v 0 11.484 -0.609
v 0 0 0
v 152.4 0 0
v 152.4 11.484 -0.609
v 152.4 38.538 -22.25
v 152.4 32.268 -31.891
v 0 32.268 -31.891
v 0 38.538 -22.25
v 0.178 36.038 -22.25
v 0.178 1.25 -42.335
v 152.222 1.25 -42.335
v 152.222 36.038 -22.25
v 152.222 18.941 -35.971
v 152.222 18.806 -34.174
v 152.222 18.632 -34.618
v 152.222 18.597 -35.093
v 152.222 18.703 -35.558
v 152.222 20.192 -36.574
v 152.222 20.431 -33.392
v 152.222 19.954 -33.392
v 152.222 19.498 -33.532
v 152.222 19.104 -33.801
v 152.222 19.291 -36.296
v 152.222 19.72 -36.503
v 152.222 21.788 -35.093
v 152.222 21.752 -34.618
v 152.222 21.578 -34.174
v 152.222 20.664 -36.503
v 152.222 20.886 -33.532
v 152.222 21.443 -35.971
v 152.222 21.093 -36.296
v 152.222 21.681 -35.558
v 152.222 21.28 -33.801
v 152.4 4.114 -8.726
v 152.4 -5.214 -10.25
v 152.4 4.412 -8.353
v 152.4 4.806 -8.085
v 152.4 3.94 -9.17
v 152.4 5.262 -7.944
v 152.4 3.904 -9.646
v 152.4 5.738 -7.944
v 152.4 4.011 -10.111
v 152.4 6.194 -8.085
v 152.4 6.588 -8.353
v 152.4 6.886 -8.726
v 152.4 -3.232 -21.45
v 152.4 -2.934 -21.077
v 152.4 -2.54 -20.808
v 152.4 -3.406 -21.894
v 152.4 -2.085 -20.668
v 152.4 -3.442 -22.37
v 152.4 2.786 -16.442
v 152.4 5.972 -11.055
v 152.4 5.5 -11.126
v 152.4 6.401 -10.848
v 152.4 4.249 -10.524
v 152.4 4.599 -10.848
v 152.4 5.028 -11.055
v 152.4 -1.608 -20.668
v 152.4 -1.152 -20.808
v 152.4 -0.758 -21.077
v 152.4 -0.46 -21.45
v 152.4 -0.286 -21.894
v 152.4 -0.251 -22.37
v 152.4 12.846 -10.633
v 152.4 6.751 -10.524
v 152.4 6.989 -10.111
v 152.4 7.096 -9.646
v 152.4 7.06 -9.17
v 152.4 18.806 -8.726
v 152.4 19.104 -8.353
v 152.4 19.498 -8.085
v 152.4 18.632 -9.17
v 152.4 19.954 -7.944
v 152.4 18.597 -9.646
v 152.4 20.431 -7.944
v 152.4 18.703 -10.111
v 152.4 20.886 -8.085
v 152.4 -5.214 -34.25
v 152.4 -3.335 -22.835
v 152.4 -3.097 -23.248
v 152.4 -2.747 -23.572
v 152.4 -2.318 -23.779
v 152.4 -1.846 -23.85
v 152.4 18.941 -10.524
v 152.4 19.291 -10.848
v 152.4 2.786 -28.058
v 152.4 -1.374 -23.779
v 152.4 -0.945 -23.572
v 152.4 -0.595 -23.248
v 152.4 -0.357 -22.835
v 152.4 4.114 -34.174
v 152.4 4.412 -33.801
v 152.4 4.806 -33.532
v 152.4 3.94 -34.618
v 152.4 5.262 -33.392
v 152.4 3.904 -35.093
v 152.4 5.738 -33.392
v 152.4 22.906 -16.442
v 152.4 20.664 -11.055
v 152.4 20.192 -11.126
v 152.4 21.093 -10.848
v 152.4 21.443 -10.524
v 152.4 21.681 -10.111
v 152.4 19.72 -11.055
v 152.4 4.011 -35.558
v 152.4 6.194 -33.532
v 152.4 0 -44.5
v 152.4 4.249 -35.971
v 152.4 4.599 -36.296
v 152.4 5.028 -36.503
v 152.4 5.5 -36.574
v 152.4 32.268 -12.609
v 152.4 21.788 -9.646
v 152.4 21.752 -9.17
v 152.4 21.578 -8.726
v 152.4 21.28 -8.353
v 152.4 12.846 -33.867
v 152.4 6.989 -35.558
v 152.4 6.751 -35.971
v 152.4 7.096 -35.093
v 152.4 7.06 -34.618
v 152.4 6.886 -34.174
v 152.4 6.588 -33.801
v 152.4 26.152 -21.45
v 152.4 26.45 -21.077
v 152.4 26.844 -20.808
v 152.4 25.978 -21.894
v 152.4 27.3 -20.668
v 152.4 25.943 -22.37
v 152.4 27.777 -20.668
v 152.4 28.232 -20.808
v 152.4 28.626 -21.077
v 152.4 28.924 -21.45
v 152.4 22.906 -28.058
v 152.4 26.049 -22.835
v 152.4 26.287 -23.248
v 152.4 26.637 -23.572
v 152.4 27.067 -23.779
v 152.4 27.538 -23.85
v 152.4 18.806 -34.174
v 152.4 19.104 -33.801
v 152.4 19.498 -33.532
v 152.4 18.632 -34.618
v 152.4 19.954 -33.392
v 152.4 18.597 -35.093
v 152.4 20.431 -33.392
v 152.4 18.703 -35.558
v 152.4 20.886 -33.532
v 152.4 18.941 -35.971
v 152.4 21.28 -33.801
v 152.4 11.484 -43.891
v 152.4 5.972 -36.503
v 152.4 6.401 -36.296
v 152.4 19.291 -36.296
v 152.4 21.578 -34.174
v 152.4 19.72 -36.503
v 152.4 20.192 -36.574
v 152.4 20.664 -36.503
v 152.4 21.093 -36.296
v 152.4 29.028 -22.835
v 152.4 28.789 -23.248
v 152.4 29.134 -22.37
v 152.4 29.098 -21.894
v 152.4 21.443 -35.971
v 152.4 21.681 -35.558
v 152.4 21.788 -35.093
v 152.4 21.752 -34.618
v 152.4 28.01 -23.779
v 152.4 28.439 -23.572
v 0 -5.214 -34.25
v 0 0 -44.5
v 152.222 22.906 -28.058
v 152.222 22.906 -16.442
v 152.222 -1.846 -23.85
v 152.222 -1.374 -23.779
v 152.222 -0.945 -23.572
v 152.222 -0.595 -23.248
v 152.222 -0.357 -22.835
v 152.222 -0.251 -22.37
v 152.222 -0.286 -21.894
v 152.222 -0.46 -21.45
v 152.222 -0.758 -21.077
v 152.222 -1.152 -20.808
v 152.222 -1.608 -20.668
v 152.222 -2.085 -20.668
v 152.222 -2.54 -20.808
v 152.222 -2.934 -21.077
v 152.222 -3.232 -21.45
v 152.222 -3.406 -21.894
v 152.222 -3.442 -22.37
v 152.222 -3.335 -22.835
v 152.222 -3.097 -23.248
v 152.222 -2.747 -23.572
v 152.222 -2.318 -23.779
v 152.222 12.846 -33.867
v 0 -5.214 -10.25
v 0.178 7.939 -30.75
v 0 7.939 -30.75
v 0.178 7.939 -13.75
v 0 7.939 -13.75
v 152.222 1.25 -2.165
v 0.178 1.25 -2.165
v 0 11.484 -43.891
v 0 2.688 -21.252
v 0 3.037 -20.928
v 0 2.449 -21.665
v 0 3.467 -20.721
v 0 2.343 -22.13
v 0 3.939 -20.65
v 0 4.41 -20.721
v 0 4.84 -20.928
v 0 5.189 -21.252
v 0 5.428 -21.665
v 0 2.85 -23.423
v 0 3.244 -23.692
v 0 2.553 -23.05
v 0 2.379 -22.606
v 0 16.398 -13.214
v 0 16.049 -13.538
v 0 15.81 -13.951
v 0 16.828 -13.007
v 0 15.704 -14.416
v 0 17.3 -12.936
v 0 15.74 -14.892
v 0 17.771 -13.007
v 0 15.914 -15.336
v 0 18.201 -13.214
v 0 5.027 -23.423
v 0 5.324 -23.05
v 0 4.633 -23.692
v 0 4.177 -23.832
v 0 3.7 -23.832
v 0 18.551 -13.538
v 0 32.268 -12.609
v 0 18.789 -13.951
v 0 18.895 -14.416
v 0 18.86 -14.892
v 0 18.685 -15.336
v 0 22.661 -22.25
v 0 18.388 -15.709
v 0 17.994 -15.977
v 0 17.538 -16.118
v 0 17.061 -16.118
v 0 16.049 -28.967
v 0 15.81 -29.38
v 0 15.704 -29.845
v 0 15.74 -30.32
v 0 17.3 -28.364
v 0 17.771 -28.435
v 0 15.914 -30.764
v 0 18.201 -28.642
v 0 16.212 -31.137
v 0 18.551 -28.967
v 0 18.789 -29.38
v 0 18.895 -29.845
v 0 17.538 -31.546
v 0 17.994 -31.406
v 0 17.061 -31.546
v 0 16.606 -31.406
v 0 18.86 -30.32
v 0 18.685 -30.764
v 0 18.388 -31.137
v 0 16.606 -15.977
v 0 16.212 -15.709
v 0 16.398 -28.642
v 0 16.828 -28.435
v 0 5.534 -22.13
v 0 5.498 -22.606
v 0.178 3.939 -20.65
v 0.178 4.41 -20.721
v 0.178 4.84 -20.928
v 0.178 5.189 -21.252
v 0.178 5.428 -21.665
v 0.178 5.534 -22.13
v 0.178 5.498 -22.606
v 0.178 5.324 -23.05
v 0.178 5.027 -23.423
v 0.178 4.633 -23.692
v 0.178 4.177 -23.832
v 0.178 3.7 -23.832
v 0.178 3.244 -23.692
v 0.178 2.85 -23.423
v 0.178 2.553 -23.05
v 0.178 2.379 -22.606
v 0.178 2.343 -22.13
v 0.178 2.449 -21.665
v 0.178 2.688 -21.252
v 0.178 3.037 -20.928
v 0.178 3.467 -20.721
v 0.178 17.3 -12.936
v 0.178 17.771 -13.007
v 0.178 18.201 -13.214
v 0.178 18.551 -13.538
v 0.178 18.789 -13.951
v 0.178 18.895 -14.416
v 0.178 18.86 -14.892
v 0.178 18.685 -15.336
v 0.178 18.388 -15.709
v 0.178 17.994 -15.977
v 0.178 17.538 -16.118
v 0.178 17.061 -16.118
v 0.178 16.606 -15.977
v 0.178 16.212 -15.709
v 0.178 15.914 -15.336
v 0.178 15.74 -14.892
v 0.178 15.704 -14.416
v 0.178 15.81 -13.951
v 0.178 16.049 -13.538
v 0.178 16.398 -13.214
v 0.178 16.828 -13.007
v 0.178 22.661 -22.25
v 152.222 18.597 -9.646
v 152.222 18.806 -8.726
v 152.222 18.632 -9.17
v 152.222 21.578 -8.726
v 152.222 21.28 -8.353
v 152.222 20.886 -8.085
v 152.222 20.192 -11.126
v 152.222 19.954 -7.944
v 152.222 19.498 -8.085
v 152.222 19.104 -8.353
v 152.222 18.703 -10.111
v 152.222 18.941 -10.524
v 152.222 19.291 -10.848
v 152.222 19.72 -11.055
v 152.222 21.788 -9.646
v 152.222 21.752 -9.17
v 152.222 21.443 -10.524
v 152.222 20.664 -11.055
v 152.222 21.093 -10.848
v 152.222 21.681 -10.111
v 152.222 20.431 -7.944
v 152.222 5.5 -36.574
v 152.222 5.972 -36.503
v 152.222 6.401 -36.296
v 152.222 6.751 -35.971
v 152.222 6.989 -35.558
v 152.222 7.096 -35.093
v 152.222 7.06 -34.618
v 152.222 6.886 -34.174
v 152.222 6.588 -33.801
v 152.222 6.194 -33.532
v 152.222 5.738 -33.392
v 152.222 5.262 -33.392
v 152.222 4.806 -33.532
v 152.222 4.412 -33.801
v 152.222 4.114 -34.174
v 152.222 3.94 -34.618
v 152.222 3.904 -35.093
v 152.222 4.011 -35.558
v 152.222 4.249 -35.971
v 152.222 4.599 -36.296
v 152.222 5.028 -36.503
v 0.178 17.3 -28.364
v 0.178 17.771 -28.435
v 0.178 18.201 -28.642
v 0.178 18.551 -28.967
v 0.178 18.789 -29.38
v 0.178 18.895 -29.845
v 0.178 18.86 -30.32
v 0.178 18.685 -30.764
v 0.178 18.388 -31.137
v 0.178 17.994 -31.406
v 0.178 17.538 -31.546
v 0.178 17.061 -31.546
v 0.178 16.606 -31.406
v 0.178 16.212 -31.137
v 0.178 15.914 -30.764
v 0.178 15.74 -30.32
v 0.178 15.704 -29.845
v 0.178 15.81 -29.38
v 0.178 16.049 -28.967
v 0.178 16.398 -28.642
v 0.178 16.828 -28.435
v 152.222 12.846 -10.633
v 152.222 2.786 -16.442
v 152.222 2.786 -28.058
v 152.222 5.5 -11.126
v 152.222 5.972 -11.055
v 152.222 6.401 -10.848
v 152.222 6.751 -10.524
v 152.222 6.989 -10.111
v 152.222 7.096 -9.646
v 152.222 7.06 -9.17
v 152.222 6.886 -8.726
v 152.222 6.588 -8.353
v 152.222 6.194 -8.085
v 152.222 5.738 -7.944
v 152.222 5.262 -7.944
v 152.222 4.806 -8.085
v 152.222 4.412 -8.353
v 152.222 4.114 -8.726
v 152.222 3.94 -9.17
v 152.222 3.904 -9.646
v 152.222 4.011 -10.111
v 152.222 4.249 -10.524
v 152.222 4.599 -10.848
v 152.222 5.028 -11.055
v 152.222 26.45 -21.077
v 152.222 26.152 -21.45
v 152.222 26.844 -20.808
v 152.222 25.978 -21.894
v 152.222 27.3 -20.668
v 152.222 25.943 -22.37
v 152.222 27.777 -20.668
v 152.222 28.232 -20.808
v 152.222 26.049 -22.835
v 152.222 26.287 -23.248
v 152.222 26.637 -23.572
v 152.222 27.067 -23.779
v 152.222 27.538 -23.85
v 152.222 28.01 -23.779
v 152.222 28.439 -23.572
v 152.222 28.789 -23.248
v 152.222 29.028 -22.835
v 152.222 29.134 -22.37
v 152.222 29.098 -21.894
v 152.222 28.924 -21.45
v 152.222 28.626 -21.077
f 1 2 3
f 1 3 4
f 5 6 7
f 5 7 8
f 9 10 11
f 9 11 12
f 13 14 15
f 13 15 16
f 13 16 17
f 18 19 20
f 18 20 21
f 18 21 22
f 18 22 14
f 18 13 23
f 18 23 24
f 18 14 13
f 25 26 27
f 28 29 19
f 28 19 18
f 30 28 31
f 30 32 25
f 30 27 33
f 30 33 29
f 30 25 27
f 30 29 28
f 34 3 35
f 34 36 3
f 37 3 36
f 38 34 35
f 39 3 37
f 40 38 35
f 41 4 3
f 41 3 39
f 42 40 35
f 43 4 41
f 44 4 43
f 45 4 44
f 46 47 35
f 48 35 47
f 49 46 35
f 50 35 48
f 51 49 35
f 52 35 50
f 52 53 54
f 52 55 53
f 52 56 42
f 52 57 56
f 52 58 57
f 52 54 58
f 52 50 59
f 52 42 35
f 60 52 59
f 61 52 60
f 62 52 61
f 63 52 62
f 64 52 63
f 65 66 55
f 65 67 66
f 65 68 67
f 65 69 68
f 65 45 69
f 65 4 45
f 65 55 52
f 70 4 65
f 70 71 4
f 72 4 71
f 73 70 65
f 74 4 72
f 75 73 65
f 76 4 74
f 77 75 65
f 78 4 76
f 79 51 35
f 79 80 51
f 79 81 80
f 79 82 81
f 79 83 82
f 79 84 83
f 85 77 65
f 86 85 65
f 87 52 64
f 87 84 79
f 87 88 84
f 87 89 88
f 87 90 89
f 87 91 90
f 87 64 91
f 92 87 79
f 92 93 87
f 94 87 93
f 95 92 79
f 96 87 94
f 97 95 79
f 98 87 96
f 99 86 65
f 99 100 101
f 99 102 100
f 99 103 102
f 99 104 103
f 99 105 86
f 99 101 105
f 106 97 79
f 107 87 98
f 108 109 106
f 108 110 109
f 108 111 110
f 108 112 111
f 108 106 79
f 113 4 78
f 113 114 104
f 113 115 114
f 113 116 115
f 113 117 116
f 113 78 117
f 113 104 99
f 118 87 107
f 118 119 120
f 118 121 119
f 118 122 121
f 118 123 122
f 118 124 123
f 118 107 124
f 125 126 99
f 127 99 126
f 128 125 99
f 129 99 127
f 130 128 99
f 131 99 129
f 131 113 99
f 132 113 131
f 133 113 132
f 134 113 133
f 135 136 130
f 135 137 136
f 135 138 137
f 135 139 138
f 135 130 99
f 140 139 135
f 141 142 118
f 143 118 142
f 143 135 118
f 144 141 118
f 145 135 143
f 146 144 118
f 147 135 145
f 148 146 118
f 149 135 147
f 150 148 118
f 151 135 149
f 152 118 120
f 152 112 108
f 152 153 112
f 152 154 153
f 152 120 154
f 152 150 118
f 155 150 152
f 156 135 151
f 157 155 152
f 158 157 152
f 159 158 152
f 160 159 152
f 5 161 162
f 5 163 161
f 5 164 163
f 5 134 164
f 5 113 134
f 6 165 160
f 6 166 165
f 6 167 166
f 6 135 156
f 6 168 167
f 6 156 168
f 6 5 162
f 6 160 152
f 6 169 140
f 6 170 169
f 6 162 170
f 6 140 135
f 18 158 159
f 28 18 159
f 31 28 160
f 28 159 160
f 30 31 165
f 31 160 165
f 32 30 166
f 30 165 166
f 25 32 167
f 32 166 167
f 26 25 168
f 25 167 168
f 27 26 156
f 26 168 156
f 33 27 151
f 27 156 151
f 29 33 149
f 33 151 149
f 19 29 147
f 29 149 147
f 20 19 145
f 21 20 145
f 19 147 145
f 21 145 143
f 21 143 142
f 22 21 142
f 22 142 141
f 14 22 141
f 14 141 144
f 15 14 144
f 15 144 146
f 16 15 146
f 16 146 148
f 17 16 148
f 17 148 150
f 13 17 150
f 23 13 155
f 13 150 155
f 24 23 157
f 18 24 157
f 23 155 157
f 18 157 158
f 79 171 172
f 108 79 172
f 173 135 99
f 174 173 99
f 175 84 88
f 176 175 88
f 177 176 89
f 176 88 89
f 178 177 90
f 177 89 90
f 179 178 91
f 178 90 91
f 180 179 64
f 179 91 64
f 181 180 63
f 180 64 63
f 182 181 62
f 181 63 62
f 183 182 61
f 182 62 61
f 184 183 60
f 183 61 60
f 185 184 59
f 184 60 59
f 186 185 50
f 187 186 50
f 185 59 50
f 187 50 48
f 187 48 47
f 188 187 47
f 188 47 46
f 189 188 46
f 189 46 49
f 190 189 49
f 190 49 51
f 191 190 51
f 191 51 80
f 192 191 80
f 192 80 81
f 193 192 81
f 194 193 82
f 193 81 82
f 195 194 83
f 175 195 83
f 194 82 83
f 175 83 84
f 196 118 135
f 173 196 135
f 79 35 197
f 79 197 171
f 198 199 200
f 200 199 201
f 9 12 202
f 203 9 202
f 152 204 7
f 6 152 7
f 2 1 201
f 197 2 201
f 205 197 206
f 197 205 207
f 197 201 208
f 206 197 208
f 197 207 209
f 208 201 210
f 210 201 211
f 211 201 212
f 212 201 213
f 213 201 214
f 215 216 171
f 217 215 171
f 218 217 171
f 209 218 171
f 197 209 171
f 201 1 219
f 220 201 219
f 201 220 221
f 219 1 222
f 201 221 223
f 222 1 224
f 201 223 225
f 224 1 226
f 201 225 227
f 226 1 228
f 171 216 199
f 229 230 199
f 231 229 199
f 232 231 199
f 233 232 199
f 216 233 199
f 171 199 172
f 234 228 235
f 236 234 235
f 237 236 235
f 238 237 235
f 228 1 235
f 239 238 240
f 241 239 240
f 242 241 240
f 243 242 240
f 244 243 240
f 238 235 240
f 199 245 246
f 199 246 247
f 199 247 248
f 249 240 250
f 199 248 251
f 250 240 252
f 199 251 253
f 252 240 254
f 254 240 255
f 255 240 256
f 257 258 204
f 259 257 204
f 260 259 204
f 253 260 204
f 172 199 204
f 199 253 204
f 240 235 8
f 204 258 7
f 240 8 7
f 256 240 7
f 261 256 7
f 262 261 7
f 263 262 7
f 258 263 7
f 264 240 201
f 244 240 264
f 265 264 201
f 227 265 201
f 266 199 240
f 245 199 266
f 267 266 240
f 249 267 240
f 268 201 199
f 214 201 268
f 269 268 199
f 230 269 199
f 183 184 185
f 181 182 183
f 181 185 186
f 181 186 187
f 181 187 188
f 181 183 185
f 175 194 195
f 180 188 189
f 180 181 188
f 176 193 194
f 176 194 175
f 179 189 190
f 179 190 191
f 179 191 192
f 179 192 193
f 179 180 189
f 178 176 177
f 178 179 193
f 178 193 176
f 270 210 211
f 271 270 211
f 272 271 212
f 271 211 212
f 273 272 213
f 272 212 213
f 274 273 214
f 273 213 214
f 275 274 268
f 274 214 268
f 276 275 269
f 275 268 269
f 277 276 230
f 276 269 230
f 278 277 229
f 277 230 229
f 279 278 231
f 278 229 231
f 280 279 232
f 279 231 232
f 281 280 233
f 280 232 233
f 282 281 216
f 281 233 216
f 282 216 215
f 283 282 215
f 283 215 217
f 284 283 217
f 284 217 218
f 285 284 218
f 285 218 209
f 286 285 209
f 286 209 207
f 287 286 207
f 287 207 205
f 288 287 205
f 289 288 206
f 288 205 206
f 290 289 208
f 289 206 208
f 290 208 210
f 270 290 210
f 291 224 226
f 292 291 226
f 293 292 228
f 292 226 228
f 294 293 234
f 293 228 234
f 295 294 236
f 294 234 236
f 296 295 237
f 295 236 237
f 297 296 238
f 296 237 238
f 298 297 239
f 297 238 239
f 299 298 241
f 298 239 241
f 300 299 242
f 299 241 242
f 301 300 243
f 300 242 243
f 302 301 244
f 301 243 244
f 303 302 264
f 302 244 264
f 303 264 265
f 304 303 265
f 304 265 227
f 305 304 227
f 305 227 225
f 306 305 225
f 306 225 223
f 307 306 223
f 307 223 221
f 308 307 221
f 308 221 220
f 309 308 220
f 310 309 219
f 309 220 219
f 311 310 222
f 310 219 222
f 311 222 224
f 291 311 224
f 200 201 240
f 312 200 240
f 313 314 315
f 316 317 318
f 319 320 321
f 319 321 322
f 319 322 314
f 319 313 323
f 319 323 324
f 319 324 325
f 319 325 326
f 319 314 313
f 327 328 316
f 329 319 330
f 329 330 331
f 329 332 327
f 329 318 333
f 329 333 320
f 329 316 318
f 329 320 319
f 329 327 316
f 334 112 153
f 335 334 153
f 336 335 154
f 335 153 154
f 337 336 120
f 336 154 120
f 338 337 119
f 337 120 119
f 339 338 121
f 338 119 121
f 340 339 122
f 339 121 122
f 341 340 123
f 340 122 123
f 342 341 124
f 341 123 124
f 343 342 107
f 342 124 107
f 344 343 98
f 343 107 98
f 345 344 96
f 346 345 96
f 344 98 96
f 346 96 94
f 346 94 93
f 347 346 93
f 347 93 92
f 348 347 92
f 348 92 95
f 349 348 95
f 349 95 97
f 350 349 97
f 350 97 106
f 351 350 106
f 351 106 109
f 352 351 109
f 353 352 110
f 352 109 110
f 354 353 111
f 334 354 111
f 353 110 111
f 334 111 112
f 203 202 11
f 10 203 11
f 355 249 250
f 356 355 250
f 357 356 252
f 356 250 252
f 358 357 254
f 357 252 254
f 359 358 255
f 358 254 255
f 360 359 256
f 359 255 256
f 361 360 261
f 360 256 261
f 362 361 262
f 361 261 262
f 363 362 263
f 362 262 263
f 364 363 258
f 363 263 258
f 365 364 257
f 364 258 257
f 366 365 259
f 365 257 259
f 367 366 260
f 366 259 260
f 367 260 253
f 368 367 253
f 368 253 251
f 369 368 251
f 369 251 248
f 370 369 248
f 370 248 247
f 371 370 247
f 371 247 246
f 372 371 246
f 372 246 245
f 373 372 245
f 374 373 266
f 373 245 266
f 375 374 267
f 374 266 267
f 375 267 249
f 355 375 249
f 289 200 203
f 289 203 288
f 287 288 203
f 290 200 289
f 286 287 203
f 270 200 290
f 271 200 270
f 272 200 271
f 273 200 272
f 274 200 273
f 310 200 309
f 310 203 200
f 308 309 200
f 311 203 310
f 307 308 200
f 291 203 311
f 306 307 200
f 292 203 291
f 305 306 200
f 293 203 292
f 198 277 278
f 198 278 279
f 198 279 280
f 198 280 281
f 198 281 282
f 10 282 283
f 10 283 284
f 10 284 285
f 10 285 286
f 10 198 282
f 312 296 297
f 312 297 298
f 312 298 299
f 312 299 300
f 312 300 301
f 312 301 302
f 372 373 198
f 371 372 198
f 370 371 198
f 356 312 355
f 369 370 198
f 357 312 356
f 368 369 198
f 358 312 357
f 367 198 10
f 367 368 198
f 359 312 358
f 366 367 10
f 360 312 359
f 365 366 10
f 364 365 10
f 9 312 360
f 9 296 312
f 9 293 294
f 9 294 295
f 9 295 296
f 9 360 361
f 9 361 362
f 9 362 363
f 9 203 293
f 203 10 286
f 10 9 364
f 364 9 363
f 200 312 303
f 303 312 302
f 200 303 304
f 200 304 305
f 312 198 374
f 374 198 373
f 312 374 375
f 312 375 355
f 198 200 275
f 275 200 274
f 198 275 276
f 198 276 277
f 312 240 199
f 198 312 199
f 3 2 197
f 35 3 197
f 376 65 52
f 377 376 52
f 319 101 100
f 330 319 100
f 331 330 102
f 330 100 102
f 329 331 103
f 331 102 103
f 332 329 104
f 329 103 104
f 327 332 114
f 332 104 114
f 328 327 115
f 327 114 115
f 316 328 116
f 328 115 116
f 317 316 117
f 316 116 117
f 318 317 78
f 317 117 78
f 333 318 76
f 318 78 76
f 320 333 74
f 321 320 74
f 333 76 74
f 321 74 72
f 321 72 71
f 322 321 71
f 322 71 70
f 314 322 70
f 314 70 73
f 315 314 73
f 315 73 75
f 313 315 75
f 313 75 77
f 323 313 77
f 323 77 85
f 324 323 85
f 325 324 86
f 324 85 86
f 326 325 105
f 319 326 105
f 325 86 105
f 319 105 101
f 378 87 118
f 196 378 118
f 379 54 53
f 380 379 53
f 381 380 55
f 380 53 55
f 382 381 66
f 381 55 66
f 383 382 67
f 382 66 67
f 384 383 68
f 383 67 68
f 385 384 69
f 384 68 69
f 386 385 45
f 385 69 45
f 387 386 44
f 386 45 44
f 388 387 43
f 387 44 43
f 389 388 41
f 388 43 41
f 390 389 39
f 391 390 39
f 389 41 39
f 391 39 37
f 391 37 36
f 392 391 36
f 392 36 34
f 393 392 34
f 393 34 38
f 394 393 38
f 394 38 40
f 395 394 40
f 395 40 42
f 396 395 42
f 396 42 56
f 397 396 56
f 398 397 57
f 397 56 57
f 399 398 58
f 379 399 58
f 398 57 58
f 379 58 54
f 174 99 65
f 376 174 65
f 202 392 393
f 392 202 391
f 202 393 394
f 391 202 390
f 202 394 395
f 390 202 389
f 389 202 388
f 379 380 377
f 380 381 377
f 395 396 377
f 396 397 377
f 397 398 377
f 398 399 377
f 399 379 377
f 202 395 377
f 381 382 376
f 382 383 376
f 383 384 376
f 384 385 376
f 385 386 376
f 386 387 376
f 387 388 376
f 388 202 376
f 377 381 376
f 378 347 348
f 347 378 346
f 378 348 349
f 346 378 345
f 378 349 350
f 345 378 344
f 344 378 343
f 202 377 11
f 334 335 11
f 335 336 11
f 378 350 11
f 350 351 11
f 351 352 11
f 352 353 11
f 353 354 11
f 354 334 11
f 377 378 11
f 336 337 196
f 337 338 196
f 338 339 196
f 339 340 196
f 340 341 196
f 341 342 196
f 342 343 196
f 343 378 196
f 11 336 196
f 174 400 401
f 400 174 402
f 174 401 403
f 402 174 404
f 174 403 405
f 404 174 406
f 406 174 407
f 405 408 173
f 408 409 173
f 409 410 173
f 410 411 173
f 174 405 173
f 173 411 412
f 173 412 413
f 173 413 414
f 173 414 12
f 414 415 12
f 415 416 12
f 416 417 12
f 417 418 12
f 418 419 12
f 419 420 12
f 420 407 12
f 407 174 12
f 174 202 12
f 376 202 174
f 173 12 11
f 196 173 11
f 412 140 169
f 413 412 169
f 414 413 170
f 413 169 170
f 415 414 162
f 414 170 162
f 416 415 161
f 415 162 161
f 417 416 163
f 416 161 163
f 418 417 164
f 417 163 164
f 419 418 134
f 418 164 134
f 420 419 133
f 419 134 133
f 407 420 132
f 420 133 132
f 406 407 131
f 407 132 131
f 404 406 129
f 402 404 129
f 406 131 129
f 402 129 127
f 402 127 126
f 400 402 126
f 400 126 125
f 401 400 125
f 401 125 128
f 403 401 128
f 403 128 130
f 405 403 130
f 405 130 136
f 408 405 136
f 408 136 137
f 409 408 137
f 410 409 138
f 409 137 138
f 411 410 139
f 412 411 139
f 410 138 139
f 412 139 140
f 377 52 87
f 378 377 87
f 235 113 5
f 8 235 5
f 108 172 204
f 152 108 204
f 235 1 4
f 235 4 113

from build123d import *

# Parameters (mm, degrees)
BOSS_EXTRUDE1_DEPTH = 152.4
SKETCH2_R           = 1.6
CUT_EXTRUDE1_DEPTH  = 0.1778
CUT_EXTRUDE4_DEPTH  = 152.0444
SKETCH6_R           = 1.6
CUT_EXTRUDE5_DEPTH  = 0.1778


with BuildPart() as part:
    # Sketch1 → Boss-Extrude1 (new body)
    with BuildSketch(Plane(origin=(0, 0, 0), x_dir=(0, 0, -1), z_dir=(1, 0, 0))):
        Polygon((43.890597967, 11.483842091), (31.890597967, 32.268451781), (22.25, 38.538130468), (44.5, 0), align=None)
        Polygon((22.25, 38.538130468), (44.5, 0), (0, 0), align=None)
        Polygon((0.609402033, 11.483842091), (12.609402033, 32.268451781), (22.25, 38.538130468), (0, 0), align=None)
        Polygon((10.25, -5.214163404), (34.25, -5.214163404), (44.5, 0), (0, 0), align=None)
    extrude(amount=BOSS_EXTRUDE1_DEPTH)

    # Sketch2 → Cut-Extrude1 (cut)
    with BuildSketch(Plane(origin=(152.4, 0, 0), x_dir=(0, 0, -1), z_dir=(1, 0, 0))):
        with Locations((22.25, 27.538130468)):
            Circle(SKETCH2_R)
        with Locations((34.973720558, 20.192086979)):
            Circle(SKETCH2_R)
        with Locations((34.973720558, 5.5)):
            Circle(SKETCH2_R)
        with Locations((22.25, -1.846043489)):
            Circle(SKETCH2_R)
        with Locations((9.526279442, 5.5)):
            Circle(SKETCH2_R)
        with Locations((9.526279442, 20.192086979)):
            Circle(SKETCH2_R)
        Polygon((16.441736842, 22.906250383), (10.633473684, 12.846043489), (16.441736842, 2.785836596), (28.058263158, 2.785836596), (33.866526316, 12.846043489), (28.058263158, 22.906250383), align=None)
    extrude(amount=-CUT_EXTRUDE1_DEPTH, mode=Mode.SUBTRACT)

    # Sketch4 → Cut-Extrude4 (cut)
    with BuildSketch(Plane(origin=(152.2222, 0, 0), x_dir=(0, 0, -1), z_dir=(1, 0, 0))):
        Polygon((22.25, 36.038130468), (2.165063509, 1.25), (42.334936491, 1.25), align=None)
    extrude(amount=-CUT_EXTRUDE4_DEPTH, mode=Mode.SUBTRACT)

    # Sketch6 → Cut-Extrude5 (cut)
    with BuildSketch(Plane.ZY):
        with Locations((-29.964101615, 17.299782134)):
            Circle(SKETCH6_R)
        with Locations((-14.535898385, 17.299782134)):
            Circle(SKETCH6_R)
        with Locations((-22.25, 3.938566201)):
            Circle(SKETCH6_R)
        Polygon((-22.25, 22.660998066), (-30.75, 7.938566201), (-13.75, 7.938566201), align=None)
    extrude(amount=-CUT_EXTRUDE5_DEPTH, mode=Mode.SUBTRACT)


solid = part.part
